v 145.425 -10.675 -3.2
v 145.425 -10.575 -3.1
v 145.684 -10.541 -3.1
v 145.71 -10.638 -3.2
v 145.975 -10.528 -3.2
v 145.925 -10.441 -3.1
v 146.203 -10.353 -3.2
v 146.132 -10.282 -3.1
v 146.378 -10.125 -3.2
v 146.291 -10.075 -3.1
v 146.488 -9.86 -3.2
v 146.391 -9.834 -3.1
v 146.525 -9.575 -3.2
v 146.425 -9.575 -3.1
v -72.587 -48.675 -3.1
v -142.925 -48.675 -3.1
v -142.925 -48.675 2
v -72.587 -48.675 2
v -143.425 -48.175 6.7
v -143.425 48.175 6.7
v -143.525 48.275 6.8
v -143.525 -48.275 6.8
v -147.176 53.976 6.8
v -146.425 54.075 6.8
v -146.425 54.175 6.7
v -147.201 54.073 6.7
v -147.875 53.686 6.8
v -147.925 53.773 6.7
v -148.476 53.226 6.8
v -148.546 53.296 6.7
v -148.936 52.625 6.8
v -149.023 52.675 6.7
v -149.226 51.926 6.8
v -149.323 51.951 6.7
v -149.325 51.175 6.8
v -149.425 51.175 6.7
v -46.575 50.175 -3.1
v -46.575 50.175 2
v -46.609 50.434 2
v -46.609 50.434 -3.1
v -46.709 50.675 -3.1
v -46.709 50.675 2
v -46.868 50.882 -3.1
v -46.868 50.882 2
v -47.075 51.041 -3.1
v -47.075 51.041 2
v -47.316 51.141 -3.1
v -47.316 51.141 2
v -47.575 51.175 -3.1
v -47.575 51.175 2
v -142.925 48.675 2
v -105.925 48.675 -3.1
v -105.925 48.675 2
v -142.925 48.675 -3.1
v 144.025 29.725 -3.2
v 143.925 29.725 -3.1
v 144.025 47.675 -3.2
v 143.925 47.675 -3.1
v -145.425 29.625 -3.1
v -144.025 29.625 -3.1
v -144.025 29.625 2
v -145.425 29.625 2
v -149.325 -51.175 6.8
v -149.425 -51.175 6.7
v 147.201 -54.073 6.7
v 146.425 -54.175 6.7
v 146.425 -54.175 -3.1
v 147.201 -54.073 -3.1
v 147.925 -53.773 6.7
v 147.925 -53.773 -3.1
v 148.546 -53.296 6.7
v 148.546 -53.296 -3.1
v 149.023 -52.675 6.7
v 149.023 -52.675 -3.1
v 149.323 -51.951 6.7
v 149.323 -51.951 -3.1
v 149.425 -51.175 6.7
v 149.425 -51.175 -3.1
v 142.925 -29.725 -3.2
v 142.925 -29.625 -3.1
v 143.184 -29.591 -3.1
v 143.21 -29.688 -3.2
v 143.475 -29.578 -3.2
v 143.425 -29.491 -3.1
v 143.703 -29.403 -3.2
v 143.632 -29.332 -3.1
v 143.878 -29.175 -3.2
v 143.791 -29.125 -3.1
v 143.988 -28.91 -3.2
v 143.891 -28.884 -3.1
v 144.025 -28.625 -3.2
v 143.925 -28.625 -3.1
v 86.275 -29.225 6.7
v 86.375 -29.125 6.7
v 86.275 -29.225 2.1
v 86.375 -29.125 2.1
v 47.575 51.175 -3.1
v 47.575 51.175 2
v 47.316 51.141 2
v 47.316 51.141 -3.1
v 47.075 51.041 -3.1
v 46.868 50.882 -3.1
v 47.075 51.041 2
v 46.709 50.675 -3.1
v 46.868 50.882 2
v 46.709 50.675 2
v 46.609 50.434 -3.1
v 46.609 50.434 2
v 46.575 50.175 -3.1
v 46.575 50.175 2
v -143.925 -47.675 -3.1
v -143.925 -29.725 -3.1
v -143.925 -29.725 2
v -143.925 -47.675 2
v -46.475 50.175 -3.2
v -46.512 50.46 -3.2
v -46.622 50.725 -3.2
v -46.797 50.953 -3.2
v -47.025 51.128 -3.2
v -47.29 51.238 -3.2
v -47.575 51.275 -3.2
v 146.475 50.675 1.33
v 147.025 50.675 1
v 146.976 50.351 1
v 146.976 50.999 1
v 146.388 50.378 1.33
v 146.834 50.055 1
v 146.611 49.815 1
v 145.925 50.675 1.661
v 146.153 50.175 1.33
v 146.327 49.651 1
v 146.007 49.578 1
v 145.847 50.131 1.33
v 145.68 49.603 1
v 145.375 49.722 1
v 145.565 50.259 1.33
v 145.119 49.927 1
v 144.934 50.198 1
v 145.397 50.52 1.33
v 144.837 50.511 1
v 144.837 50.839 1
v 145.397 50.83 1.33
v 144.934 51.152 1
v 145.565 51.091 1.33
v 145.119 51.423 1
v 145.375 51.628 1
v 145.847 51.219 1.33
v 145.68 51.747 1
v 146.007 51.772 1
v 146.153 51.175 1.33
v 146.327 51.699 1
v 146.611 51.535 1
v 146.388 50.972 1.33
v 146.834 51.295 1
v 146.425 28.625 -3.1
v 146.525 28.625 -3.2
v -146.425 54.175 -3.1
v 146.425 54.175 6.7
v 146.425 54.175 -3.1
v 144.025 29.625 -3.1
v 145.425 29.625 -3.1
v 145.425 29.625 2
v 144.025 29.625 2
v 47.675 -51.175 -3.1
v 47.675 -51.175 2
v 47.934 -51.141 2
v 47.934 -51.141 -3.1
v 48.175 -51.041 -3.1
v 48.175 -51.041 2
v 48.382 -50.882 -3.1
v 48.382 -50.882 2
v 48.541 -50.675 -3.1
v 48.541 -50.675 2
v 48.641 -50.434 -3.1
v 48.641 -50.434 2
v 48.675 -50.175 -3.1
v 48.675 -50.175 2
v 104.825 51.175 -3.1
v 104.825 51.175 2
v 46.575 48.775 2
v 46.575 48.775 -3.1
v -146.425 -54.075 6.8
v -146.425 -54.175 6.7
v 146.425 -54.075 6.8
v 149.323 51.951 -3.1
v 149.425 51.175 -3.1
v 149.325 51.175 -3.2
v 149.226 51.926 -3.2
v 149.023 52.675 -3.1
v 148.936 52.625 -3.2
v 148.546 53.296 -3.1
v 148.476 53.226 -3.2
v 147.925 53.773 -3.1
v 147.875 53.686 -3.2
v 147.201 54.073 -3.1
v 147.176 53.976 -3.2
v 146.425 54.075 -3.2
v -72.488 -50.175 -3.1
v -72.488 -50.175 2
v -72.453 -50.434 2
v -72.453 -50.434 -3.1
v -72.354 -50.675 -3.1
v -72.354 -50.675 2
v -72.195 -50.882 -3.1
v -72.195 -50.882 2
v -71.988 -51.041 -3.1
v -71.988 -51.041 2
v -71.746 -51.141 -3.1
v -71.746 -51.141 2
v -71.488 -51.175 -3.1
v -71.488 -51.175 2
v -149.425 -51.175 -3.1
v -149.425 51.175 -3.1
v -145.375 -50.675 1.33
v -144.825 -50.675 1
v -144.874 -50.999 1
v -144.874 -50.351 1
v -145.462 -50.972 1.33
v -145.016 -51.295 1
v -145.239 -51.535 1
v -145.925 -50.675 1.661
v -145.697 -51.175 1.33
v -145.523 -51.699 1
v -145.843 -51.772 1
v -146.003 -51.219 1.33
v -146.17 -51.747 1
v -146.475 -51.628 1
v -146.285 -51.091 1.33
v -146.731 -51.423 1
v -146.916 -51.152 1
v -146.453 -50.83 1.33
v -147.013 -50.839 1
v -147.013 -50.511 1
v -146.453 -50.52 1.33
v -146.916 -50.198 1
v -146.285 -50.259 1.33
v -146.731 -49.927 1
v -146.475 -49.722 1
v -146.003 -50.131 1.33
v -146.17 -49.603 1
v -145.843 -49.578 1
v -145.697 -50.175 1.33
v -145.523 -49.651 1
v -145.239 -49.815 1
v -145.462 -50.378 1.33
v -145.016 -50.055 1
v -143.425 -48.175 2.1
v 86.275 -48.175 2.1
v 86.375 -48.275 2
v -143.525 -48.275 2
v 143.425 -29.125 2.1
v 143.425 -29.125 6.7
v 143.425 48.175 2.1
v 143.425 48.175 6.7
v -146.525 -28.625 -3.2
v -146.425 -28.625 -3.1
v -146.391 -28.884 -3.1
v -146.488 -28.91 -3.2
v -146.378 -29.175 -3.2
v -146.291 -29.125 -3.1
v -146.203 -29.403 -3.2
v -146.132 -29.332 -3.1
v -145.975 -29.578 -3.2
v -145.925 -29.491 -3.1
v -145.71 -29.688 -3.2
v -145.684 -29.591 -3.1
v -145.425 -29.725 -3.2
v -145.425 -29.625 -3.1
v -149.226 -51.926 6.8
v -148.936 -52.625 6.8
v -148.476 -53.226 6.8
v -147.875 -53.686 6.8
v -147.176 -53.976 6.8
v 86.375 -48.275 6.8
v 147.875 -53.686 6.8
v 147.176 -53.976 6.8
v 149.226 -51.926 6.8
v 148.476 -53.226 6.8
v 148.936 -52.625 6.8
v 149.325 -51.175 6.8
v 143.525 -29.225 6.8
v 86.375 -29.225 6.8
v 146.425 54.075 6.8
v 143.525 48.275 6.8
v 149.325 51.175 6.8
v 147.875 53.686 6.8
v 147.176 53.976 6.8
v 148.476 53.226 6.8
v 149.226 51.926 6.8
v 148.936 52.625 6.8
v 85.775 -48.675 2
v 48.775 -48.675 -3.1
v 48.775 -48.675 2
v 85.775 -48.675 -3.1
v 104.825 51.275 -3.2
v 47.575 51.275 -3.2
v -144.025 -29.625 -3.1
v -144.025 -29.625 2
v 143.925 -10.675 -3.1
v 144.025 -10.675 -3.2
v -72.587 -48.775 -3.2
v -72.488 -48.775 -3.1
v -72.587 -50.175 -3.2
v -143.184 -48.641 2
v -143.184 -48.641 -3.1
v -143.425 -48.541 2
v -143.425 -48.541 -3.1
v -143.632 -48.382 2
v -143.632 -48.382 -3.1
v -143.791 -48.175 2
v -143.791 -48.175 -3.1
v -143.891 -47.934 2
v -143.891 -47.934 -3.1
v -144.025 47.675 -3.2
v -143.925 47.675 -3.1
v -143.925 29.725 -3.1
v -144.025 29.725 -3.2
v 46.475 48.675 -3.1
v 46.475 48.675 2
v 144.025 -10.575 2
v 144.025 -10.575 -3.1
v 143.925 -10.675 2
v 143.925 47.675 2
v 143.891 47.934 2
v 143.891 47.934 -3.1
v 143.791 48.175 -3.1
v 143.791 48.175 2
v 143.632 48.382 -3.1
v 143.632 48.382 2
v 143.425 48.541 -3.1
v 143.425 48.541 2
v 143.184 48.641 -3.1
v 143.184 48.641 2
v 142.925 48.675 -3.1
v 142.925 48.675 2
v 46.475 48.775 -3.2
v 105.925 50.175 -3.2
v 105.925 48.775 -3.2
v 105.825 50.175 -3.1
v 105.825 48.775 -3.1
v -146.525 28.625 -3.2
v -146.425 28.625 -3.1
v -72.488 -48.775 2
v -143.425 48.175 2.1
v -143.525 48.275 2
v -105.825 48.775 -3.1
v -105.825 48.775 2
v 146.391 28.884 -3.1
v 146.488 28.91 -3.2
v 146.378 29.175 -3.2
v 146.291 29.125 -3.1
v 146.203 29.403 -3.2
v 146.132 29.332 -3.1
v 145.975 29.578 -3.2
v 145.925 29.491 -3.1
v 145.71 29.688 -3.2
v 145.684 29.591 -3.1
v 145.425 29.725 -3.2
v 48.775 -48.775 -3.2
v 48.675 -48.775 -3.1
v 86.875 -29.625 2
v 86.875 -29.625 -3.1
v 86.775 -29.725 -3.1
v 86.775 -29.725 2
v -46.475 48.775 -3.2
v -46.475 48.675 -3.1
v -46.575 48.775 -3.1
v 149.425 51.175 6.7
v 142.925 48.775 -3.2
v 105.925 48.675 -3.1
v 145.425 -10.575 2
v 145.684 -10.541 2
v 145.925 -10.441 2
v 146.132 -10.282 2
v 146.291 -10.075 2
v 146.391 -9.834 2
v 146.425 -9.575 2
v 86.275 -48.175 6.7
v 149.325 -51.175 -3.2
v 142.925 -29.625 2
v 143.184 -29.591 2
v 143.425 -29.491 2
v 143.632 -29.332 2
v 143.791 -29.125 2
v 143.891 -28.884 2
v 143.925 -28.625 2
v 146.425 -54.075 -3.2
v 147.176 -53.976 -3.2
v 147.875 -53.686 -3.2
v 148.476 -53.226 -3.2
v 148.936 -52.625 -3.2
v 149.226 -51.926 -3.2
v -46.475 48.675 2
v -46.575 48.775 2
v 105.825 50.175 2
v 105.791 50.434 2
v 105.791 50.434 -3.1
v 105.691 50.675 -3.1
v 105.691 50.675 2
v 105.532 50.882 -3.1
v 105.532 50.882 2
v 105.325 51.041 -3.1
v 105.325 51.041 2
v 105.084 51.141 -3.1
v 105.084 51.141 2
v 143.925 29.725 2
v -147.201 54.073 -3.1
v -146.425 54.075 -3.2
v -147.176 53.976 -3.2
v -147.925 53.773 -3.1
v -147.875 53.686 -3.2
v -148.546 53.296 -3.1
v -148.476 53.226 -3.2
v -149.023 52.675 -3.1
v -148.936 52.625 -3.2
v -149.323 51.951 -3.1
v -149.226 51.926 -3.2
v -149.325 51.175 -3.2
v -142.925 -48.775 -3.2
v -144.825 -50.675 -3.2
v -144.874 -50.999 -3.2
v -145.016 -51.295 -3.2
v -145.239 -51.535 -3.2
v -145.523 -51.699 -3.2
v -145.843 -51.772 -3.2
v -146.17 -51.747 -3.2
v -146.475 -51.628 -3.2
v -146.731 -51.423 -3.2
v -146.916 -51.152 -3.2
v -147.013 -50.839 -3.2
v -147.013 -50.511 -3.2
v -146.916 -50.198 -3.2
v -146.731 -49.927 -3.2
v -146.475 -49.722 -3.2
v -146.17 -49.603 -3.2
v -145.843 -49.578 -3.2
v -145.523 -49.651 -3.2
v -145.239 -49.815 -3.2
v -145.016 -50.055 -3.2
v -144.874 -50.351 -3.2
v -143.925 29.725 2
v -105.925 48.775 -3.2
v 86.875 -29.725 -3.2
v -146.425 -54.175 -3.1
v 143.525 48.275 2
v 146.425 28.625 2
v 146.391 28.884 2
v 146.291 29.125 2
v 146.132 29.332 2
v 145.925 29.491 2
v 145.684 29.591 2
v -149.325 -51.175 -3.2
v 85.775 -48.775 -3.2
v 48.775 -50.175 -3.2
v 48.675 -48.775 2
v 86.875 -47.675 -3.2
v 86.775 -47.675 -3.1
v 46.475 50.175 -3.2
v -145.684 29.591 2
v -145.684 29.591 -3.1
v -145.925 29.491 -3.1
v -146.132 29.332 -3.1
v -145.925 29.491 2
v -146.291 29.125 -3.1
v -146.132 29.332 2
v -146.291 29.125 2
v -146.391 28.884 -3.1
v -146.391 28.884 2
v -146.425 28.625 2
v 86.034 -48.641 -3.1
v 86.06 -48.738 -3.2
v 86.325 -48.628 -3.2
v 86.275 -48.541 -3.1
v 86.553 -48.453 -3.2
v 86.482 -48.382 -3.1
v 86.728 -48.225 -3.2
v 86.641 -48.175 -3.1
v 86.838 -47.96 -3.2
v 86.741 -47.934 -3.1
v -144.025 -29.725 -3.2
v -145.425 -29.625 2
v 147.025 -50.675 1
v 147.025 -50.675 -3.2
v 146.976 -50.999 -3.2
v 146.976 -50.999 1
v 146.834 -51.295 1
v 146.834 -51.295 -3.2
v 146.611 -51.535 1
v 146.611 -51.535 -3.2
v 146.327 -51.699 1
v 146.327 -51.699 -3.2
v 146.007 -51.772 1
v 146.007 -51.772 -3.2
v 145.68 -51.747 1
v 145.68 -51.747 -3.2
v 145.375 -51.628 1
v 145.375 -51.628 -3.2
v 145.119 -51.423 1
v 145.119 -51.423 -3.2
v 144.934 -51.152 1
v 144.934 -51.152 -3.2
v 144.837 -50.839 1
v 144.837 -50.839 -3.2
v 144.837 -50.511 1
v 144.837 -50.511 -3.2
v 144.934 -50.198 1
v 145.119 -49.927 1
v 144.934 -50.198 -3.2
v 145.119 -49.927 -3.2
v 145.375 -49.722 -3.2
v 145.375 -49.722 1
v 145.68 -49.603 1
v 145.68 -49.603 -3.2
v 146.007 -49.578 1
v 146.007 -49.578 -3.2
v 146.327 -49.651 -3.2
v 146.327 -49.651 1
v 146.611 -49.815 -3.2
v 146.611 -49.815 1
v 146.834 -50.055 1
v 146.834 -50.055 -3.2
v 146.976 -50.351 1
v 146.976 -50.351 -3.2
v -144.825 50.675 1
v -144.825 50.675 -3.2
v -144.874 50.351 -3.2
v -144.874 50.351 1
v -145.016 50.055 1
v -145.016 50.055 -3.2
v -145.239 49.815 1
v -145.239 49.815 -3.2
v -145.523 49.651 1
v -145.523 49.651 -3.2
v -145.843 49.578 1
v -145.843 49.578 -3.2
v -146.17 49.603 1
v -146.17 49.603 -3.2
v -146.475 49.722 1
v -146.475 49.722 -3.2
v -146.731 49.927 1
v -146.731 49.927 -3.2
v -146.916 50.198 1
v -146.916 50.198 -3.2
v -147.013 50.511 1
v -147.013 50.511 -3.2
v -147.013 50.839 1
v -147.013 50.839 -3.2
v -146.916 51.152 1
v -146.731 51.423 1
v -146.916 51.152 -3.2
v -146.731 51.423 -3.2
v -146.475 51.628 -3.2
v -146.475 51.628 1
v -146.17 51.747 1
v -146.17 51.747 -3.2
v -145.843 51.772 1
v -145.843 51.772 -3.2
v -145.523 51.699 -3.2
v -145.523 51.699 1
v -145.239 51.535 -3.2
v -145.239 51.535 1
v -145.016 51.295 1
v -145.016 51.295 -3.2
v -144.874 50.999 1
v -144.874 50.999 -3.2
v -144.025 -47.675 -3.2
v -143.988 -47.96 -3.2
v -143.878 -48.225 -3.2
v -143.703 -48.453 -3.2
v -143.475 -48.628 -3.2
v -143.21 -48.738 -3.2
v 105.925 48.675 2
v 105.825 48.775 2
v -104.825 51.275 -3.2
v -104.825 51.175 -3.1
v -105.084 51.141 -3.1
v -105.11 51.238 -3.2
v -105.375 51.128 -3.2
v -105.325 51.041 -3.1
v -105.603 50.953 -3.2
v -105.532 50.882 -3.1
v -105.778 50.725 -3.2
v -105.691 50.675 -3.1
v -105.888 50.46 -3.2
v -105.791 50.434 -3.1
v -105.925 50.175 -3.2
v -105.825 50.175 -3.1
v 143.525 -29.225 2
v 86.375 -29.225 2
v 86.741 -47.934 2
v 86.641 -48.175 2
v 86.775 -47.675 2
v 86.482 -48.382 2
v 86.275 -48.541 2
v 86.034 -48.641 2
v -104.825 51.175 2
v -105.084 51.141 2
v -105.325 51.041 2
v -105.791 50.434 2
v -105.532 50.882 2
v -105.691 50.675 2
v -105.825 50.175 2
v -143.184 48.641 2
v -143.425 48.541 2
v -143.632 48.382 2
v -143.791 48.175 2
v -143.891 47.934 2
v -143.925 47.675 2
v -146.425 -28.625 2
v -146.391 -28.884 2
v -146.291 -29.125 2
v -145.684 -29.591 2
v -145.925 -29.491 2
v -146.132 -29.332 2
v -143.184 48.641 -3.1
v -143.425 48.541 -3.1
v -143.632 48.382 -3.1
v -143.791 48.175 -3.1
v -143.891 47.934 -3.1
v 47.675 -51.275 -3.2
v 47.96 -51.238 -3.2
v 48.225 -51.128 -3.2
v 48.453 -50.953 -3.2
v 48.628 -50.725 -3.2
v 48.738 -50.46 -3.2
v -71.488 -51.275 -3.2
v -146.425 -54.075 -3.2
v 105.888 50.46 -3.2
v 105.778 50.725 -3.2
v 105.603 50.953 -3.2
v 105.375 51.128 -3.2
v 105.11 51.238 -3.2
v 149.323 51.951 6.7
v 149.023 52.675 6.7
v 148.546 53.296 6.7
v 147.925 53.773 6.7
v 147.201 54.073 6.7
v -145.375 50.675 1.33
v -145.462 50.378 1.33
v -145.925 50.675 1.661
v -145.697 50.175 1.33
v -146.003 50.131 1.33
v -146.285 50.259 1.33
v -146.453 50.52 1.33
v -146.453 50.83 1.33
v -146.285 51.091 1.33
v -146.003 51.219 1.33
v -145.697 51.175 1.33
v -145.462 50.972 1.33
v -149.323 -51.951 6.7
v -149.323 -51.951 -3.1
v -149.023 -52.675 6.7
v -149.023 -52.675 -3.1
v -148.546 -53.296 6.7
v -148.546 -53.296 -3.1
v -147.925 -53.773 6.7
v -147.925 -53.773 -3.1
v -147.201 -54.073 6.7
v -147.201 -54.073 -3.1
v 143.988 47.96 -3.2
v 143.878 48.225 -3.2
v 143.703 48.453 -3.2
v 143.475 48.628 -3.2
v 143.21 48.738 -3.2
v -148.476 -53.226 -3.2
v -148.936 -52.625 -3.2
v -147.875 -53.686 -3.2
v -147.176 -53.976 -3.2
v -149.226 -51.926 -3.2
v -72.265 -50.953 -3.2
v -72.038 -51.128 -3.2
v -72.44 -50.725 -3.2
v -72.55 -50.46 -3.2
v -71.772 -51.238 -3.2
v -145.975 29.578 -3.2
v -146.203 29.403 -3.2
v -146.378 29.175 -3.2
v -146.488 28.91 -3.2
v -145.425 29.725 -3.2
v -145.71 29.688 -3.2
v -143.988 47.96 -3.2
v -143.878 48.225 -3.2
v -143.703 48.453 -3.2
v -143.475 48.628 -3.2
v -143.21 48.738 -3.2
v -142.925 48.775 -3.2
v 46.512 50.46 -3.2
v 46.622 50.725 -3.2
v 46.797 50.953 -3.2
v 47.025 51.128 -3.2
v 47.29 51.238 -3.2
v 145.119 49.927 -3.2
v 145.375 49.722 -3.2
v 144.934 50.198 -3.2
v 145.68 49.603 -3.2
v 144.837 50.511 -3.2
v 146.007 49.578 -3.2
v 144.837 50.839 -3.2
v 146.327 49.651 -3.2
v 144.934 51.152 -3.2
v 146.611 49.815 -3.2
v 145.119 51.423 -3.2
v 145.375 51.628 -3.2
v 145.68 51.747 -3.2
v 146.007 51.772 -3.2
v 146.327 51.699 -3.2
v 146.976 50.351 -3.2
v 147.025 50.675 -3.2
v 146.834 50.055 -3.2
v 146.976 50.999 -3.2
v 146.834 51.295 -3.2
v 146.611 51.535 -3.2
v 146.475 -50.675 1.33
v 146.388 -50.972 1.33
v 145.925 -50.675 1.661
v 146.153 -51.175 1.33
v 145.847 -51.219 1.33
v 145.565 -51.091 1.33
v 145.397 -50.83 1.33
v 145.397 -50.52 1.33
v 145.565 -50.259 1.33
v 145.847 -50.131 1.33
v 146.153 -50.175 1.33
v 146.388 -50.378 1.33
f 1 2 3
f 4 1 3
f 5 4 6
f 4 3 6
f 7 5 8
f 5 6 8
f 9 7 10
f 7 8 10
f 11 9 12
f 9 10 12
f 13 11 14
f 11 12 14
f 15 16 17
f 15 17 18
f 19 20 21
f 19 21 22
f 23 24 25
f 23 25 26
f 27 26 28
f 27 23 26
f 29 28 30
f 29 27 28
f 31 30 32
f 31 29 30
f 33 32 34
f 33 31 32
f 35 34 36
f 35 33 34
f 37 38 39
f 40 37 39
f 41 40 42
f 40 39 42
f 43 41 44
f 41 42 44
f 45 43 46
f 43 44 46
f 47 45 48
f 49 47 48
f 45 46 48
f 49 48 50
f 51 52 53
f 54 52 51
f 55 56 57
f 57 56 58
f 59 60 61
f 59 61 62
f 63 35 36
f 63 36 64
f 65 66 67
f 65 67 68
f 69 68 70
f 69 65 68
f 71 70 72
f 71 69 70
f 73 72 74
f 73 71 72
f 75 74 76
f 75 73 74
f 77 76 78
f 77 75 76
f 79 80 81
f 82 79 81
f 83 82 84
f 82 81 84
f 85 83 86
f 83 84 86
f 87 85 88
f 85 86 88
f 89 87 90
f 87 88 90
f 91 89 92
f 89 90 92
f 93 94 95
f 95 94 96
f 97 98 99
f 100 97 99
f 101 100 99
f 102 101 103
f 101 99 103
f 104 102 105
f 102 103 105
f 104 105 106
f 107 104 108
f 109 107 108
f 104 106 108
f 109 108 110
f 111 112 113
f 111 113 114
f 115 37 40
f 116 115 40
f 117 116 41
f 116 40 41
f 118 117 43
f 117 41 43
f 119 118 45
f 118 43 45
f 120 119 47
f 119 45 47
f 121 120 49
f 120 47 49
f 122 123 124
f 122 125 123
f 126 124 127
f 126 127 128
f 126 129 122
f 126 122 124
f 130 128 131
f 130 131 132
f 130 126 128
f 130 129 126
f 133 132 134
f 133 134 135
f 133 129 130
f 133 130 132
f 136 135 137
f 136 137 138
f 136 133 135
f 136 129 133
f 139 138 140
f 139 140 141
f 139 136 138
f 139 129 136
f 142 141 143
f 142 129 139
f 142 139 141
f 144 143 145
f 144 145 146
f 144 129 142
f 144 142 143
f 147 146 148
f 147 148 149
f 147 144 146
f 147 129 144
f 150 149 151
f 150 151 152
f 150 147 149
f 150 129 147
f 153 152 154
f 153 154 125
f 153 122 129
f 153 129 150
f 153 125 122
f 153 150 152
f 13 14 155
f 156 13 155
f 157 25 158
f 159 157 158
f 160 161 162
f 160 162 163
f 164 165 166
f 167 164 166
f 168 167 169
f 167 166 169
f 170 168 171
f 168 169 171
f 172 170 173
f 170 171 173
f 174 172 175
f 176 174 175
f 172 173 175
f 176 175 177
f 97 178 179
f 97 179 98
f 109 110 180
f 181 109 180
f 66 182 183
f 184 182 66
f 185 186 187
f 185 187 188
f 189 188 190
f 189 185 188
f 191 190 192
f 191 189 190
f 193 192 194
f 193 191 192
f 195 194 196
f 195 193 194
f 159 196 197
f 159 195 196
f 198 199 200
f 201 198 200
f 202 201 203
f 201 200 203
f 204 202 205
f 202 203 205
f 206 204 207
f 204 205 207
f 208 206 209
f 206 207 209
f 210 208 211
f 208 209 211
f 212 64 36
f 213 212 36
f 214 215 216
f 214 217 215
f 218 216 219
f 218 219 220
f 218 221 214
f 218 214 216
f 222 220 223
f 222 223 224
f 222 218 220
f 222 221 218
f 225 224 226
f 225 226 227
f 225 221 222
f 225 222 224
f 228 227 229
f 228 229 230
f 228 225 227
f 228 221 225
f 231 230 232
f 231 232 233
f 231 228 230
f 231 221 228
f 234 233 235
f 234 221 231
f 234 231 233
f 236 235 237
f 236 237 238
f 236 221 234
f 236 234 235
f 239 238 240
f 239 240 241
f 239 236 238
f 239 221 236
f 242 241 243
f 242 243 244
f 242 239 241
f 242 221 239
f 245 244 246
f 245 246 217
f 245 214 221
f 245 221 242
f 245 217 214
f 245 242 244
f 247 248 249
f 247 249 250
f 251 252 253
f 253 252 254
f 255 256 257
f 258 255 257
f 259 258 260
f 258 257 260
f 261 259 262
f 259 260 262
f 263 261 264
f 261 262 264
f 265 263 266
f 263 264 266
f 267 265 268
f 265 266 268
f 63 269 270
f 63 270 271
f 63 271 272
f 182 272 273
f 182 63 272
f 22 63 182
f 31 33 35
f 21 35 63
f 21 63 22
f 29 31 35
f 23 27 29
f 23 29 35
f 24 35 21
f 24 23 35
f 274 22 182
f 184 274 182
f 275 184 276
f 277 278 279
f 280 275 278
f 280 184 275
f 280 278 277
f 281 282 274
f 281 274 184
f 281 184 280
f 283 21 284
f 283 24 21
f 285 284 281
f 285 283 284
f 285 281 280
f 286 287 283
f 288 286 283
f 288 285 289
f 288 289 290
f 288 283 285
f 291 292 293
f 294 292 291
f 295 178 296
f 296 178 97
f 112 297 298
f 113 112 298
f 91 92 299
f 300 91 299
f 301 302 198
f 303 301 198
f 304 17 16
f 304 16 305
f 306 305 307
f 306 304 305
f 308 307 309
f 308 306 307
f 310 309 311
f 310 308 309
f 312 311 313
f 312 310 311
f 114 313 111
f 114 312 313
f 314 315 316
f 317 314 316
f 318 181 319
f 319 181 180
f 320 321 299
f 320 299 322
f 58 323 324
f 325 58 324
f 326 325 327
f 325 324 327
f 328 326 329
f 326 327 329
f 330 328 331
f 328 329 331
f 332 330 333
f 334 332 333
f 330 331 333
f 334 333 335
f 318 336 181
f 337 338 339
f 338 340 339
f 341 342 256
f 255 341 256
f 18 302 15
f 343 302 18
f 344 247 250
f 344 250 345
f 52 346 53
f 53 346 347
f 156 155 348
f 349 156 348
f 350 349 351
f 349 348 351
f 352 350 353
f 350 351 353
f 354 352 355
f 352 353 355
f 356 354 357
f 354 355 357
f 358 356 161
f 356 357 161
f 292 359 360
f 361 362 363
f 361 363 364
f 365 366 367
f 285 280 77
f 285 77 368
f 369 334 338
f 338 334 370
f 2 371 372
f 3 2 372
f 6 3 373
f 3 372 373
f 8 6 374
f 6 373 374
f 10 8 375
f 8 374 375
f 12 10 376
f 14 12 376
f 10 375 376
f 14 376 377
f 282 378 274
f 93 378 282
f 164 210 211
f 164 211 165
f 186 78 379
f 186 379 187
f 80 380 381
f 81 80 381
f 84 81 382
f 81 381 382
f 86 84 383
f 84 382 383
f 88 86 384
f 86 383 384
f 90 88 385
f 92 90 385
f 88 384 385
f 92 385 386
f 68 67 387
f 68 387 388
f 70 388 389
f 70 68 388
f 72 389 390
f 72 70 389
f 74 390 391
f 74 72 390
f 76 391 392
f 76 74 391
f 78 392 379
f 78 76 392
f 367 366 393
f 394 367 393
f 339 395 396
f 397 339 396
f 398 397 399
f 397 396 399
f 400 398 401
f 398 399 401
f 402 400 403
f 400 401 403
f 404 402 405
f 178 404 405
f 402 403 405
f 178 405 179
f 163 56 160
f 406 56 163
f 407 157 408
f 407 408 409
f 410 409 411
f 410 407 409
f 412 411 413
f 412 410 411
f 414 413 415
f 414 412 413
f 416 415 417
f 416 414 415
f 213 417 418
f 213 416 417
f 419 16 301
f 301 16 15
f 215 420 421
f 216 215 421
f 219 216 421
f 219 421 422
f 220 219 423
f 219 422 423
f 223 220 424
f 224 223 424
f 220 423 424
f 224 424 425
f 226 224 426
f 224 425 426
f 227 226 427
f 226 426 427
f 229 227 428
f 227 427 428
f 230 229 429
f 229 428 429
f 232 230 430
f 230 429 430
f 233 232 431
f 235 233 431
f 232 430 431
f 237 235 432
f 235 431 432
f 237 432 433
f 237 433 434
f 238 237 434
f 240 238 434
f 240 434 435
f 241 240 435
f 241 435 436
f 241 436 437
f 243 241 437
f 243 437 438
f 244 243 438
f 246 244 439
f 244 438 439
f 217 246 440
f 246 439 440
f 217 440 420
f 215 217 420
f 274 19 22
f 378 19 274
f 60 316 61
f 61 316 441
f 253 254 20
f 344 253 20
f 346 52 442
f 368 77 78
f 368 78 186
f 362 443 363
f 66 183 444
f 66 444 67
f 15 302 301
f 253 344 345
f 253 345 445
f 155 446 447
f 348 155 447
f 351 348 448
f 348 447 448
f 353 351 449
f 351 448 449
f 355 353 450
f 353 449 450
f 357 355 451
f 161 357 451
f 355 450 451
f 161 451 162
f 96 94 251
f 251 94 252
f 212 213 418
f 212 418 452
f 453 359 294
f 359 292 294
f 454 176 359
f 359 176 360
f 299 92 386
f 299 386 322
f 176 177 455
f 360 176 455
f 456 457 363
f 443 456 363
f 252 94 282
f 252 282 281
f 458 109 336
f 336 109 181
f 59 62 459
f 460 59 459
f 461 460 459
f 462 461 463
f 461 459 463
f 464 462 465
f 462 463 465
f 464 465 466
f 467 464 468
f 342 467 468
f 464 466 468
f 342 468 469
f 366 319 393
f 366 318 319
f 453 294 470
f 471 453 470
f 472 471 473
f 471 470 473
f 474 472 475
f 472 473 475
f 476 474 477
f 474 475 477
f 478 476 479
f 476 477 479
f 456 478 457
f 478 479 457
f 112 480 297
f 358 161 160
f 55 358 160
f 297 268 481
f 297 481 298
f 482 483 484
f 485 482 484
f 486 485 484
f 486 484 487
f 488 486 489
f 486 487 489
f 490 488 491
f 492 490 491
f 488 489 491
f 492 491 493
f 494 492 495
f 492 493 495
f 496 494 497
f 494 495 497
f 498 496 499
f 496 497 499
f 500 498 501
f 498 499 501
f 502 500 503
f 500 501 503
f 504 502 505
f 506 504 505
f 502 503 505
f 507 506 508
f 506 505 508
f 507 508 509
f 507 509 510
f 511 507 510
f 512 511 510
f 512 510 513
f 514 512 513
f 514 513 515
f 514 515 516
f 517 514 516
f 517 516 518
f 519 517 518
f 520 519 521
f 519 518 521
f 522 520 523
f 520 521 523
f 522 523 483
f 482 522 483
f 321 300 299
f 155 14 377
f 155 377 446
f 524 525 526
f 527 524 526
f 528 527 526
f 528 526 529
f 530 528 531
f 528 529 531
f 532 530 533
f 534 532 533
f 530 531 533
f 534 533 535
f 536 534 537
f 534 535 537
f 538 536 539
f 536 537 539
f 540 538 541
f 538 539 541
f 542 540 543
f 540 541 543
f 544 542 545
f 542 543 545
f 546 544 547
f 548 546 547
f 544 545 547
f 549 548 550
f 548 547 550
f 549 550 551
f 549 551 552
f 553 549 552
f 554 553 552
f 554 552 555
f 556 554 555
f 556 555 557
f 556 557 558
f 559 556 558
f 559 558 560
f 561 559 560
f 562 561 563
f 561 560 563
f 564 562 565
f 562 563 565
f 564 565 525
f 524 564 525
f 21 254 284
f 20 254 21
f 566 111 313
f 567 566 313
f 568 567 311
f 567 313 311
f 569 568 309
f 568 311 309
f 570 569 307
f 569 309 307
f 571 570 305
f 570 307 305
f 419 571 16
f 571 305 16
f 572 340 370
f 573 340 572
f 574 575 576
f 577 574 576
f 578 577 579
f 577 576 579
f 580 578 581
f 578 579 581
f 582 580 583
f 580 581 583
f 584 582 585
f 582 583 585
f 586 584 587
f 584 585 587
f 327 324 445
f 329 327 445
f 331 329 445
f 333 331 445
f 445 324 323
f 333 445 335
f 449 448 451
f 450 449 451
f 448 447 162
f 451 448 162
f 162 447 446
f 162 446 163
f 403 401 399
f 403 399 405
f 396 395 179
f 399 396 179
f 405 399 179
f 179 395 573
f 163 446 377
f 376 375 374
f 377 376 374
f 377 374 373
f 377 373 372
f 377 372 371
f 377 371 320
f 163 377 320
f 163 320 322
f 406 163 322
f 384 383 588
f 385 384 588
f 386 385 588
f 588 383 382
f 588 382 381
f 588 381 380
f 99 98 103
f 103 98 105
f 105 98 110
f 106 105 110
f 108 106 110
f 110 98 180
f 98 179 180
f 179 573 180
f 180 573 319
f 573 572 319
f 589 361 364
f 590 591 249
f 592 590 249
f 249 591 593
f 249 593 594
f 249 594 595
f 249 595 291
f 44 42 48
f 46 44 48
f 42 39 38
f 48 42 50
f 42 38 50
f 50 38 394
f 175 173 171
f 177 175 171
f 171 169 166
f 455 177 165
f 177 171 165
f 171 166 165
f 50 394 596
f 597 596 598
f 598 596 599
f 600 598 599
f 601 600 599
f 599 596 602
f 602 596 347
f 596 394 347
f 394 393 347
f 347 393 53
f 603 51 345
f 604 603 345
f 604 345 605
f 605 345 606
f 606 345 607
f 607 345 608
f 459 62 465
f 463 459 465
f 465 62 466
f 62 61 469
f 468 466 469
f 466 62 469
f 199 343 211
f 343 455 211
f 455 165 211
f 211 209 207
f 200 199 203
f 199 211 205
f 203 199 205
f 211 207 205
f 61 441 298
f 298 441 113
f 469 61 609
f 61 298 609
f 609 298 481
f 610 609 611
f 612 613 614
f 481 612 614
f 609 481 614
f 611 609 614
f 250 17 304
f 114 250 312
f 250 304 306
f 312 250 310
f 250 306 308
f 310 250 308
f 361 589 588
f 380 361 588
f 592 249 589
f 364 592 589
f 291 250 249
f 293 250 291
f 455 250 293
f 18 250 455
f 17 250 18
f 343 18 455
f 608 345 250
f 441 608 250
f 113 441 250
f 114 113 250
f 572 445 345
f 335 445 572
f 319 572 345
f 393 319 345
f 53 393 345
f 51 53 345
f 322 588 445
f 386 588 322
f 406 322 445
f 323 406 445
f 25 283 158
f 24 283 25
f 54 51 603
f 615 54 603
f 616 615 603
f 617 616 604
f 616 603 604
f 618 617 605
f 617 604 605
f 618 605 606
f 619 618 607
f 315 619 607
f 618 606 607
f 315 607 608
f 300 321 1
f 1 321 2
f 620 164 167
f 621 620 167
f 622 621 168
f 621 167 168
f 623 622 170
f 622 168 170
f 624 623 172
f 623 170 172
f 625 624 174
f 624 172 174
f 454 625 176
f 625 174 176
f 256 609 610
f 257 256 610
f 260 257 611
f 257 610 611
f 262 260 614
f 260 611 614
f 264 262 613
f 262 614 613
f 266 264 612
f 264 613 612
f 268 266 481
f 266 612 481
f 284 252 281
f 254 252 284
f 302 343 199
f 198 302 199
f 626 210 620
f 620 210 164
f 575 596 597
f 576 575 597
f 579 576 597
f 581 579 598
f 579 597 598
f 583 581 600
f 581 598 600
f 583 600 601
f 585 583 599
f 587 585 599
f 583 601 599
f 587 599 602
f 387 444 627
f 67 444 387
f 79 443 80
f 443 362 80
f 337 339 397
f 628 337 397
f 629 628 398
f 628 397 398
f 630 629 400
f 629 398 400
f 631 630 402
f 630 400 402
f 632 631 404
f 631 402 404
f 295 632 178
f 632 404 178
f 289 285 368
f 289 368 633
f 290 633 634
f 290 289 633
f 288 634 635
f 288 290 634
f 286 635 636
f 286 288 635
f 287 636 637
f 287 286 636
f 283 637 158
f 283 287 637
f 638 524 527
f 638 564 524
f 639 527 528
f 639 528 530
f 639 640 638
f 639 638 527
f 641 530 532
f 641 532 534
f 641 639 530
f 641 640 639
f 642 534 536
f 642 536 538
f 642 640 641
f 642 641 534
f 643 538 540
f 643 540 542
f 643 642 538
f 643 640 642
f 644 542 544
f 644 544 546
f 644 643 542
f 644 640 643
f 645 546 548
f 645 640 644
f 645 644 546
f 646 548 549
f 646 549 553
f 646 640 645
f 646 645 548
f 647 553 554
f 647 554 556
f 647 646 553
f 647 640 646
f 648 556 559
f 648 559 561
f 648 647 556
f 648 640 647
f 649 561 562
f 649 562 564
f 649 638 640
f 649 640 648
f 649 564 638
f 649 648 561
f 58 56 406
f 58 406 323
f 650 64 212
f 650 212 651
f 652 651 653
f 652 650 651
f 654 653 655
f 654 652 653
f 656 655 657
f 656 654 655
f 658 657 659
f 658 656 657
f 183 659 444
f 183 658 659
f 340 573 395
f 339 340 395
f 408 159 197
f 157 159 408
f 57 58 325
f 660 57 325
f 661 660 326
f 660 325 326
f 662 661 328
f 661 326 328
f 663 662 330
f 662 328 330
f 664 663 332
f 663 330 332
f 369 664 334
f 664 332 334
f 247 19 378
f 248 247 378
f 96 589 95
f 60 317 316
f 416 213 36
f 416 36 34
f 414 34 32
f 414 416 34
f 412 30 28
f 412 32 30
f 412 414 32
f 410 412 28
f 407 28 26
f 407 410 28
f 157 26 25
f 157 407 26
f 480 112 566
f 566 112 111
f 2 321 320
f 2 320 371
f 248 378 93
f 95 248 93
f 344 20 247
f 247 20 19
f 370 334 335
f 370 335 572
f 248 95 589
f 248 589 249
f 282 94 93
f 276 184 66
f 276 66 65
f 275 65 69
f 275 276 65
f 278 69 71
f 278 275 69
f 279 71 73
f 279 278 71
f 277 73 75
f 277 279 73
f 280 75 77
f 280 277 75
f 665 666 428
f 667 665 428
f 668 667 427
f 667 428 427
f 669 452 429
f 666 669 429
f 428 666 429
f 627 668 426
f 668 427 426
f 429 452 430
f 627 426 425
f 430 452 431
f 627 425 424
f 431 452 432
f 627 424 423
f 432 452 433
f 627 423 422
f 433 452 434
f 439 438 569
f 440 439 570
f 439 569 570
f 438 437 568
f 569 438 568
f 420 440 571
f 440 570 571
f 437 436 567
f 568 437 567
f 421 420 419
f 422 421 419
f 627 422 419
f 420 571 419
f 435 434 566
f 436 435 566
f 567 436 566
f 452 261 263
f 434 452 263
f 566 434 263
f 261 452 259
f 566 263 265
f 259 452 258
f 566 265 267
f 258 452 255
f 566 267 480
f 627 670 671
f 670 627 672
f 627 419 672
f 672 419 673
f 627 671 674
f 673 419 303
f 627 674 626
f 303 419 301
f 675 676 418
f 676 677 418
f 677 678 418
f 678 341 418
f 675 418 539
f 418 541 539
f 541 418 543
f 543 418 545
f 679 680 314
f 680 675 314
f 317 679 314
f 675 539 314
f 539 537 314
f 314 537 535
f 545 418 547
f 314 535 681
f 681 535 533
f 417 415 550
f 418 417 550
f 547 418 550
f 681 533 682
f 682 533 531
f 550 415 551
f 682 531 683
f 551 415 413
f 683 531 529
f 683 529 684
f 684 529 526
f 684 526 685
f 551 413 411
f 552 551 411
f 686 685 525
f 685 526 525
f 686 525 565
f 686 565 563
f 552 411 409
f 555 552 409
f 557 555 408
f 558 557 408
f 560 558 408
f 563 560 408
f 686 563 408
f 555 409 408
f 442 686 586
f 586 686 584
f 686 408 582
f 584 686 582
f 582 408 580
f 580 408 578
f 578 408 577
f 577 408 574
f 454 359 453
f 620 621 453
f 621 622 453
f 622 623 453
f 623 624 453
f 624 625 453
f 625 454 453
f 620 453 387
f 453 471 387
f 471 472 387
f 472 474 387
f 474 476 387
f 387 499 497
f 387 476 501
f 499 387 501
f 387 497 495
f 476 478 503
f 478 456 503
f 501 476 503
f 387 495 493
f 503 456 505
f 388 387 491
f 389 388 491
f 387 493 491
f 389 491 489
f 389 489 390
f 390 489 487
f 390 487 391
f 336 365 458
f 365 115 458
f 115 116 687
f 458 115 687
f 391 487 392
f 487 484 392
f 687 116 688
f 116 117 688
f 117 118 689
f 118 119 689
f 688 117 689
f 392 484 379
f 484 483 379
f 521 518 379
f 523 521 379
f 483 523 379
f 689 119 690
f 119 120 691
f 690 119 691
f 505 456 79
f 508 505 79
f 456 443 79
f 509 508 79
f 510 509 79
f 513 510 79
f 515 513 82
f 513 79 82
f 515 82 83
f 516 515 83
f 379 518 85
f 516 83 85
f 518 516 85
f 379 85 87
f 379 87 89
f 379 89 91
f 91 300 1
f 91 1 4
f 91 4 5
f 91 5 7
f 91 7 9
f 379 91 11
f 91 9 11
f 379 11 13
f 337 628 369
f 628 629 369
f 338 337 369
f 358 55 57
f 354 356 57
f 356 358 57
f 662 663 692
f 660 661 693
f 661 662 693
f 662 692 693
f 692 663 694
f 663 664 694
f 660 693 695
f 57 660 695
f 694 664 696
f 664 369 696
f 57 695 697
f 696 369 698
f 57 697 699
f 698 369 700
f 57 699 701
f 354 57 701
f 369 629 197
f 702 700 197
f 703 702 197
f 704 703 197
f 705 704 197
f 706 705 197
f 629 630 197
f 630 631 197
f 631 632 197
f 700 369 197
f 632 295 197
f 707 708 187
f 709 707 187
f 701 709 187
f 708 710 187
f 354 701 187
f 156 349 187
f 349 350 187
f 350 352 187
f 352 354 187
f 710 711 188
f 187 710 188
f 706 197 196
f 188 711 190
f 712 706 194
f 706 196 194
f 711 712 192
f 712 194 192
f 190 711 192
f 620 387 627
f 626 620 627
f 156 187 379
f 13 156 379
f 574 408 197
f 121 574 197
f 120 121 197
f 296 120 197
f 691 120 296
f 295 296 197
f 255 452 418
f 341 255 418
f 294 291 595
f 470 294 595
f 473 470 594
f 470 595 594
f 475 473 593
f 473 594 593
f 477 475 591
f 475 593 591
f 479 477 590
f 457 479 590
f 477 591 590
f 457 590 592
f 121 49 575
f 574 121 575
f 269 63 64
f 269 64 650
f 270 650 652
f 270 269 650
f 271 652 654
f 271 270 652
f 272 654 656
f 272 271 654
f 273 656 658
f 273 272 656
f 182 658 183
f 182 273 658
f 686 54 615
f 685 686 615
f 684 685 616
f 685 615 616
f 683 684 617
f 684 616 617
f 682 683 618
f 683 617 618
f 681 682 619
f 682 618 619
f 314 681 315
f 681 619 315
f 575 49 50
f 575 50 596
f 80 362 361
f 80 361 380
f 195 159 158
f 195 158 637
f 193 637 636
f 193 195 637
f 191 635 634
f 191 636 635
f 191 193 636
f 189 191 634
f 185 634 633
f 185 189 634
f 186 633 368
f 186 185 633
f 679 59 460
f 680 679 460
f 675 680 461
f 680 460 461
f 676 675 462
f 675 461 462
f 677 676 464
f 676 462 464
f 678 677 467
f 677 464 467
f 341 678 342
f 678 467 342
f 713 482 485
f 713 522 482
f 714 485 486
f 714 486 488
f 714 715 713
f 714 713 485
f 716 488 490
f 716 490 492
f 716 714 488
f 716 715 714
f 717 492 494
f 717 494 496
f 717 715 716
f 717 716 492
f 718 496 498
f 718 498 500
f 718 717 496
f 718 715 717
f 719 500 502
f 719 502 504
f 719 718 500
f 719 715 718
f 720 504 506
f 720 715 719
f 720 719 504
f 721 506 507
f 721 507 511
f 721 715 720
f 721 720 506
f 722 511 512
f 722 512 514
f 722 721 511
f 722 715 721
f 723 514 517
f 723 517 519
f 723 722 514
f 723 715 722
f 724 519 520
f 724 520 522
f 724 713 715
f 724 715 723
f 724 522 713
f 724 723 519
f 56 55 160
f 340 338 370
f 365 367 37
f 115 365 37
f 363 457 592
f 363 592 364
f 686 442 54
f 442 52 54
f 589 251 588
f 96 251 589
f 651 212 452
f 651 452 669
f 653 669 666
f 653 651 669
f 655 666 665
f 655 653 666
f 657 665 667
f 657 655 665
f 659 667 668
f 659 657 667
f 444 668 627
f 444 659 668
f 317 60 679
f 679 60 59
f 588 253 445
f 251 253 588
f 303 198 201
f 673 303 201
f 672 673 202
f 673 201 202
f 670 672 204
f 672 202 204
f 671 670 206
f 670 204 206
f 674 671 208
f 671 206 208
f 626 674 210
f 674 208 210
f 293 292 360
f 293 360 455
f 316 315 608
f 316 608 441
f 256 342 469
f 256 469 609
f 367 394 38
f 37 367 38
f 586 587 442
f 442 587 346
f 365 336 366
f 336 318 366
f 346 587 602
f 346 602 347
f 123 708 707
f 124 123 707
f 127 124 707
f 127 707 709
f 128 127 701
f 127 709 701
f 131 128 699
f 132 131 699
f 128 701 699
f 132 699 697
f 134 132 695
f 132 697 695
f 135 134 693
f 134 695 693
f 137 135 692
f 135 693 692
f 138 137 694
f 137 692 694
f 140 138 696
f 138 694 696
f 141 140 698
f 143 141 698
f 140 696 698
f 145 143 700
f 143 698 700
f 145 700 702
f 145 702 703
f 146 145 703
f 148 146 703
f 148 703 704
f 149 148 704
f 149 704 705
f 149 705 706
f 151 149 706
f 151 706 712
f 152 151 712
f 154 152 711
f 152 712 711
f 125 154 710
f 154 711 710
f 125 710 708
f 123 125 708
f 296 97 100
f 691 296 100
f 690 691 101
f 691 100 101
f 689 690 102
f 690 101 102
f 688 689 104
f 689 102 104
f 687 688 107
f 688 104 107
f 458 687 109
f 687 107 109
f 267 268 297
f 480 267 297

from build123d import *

# Parameters (mm, degrees)
SKETCH004_W       = 298.85
SKETCH004_H       = 108.35
PAD002_DEPTH      = 6.8
PAD002_DEPTH_BACK = 3.2
SKETCH010_R       = 1.1
HOLE001_DEPTH     = 4.2
HOLE001_TIPS_R    = 1.1
FILLET003_R       = 3
POCKET004_DEPTH   = 5.2
FILLET005_R       = 1
CHAMFER003_SIZE   = 0.1


with BuildPart() as part:
    # Sketch004 → Pad002 (new body, two sides)
    with BuildSketch(Plane.XY) as pad002_sk:
        Rectangle(SKETCH004_W, SKETCH004_H)
        Polygon((-143.425, 48.175), (-143.425, -48.175), (86.275, -48.175), (86.275, -29.125), (143.425, -29.125), (143.425, 48.175), align=None, mode=Mode.SUBTRACT)
    extrude(amount=PAD002_DEPTH)
    extrude(pad002_sk.sketch, amount=-PAD002_DEPTH_BACK)

    # Sketch010 (on Face11 of Pad002) → Hole001 (cut)
    with BuildSketch(Plane(origin=(0, 0, -3.2), x_dir=(1, 0, 0), z_dir=(0, 0, -1))):
        with Locations((-145.925, 50.675)):
            Circle(SKETCH010_R)
        with Locations((-145.925, -50.675)):
            Circle(SKETCH010_R)
        with Locations((145.925, 50.675)):
            Circle(SKETCH010_R)
        with Locations((145.925, -50.675)):
            Circle(SKETCH010_R)
    extrude(amount=-HOLE001_DEPTH, mode=Mode.SUBTRACT)

    # Hole001 tips → Hole001 tip 1 section 0
    with BuildSketch(Plane(origin=(0, 0, 1), x_dir=(1, 0, 0), z_dir=(0, 0, -1)), mode=Mode.PRIVATE) as hole001_tip_1_s0:
        with Locations((-145.925, 50.675)):
            Circle(HOLE001_TIPS_R)
    loft([hole001_tip_1_s0.sketch, Vertex(-145.925, -50.675, 1.660947)], mode=Mode.SUBTRACT)

    # Hole001 tips → Hole001 tip 2 section 0
    with BuildSketch(Plane(origin=(0, 0, 1), x_dir=(1, 0, 0), z_dir=(0, 0, -1)), mode=Mode.PRIVATE) as hole001_tip_2_s0:
        with Locations((-145.925, -50.675)):
            Circle(HOLE001_TIPS_R)
    loft([hole001_tip_2_s0.sketch, Vertex(-145.925, 50.675, 1.660947)], mode=Mode.SUBTRACT)

    # Hole001 tips → Hole001 tip 3 section 0
    with BuildSketch(Plane(origin=(0, 0, 1), x_dir=(1, 0, 0), z_dir=(0, 0, -1)), mode=Mode.PRIVATE) as hole001_tip_3_s0:
        with Locations((145.925, 50.675)):
            Circle(HOLE001_TIPS_R)
    loft([hole001_tip_3_s0.sketch, Vertex(145.925, -50.675, 1.660947)], mode=Mode.SUBTRACT)

    # Hole001 tips → Hole001 tip 4 section 0
    with BuildSketch(Plane(origin=(0, 0, 1), x_dir=(1, 0, 0), z_dir=(0, 0, -1)), mode=Mode.PRIVATE) as hole001_tip_4_s0:
        with Locations((145.925, -50.675)):
            Circle(HOLE001_TIPS_R)
    loft([hole001_tip_4_s0.sketch, Vertex(145.925, 50.675, 1.660947)], mode=Mode.SUBTRACT)

    # Fillet003
    fillet003_edges = [part.edges().sort_by_distance(p)[0] for p in [
        (149.425, 54.175, 1.8),
        (149.425, -54.175, 1.8),
        (-149.425, 54.175, 1.8),
        (-149.425, -54.175, 1.8),
    ]]
    fillet(fillet003_edges, radius=FILLET003_R)

    # Sketch011 (on Face2 of Fillet003) → Pocket004 (cut)
    with BuildSketch(Plane(origin=(0, 0, -3.2), x_dir=(1, 0, 0), z_dir=(0, 0, -1))):
        Polygon((-143.925, 48.675), (-72.4875, 48.675), (-72.4875, 51.175), (48.675, 51.175), (48.675, 48.675), (86.775, 48.675), (86.775, 29.625), (143.925, 29.625), (143.925, 10.575), (146.425, 10.575), (146.425, -29.625), (143.925, -29.625), (143.925, -48.675), (105.825, -48.675), (105.825, -51.175), (46.575, -51.175), (46.575, -48.675), (-46.575, -48.675), (-46.575, -51.175), (-105.825, -51.175), (-105.825, -48.675), (-143.925, -48.675), (-143.925, -29.625), (-146.425, -29.625), (-146.425, 29.625), (-143.925, 29.625), align=None)
    extrude(amount=-POCKET004_DEPTH, mode=Mode.SUBTRACT)

    # Fillet005
    fillet005_edges = [part.edges().sort_by_distance(p)[0] for p in [
        (146.425, -10.575, -0.6),
        (143.925, -29.625, -0.6),
        (146.425, 29.625, -0.6),
        (143.925, 48.675, -0.6),
        (105.825, 51.175, -0.6),
        (46.575, 51.175, -0.6),
        (-46.575, 51.175, -0.6),
        (-105.825, 51.175, -0.6),
        (-143.925, 48.675, -0.6),
        (-146.425, 29.625, -0.6),
        (-146.425, -29.625, -0.6),
        (-143.925, -48.675, -0.6),
        (48.675, -51.175, -0.6),
        (-72.4875, -51.175, -0.6),
        (86.775, -48.675, -0.6),
    ]]
    fillet(fillet005_edges, radius=FILLET005_R)

    # Chamfer003
    chamfer003_edges = [part.edges().sort_by_distance(p)[0] for p in [
        (0, 48.675, -3.2),
        (76.2, 51.175, -3.2),
        (143.925, 38.65, -3.2),
        (146.425, 9.525, -3.2),
        (114.85, -29.625, -3.2),
        (86.775, -38.65, -3.2),
        (-146.425, 0, -3.2),
        (-143.925, 38.65, -3.2),
        (-143.925, 29.625, -0.6),
        (-46.575, 48.675, -0.6),
        (86.775, -29.625, -0.6),
        (-72.4875, -48.675, -0.6),
        (-11.90625, -51.175, -3.2),
        (-107.70625, -48.675, -3.2),
        (48.675, -48.675, -0.6),
        (-143.925, -29.625, -0.6),
        (-105.825, 48.675, -0.6),
        (143.925, 29.625, -0.6),
        (143.925, -10.575, -0.6),
        (105.825, 48.675, -0.6),
        (46.575, 48.675, -0.6),
        (-46.575, 49.425, -3.2),
        (114.85, -29.125, 2),
        (86.275, -38.65, 2),
        (86.275, -29.125, 4.4),
        (-28.575, -48.175, 2),
        (143.425, 9.525, 2),
        (0, 48.175, 2),
        (-143.425, 0, 2),
        (-148.54632, -53.29632, -3.2),
        (148.54632, -53.29632, 6.8),
        (143.425, 9.525, 6.8),
        (114.85, -29.125, 6.8),
        (86.275, -38.65, 6.8),
        (-28.575, -48.175, 6.8),
        (0, 48.175, 6.8),
        (-143.425, 0, 6.8),
    ]]
    chamfer(chamfer003_edges, length=CHAMFER003_SIZE)


solid = part.part
